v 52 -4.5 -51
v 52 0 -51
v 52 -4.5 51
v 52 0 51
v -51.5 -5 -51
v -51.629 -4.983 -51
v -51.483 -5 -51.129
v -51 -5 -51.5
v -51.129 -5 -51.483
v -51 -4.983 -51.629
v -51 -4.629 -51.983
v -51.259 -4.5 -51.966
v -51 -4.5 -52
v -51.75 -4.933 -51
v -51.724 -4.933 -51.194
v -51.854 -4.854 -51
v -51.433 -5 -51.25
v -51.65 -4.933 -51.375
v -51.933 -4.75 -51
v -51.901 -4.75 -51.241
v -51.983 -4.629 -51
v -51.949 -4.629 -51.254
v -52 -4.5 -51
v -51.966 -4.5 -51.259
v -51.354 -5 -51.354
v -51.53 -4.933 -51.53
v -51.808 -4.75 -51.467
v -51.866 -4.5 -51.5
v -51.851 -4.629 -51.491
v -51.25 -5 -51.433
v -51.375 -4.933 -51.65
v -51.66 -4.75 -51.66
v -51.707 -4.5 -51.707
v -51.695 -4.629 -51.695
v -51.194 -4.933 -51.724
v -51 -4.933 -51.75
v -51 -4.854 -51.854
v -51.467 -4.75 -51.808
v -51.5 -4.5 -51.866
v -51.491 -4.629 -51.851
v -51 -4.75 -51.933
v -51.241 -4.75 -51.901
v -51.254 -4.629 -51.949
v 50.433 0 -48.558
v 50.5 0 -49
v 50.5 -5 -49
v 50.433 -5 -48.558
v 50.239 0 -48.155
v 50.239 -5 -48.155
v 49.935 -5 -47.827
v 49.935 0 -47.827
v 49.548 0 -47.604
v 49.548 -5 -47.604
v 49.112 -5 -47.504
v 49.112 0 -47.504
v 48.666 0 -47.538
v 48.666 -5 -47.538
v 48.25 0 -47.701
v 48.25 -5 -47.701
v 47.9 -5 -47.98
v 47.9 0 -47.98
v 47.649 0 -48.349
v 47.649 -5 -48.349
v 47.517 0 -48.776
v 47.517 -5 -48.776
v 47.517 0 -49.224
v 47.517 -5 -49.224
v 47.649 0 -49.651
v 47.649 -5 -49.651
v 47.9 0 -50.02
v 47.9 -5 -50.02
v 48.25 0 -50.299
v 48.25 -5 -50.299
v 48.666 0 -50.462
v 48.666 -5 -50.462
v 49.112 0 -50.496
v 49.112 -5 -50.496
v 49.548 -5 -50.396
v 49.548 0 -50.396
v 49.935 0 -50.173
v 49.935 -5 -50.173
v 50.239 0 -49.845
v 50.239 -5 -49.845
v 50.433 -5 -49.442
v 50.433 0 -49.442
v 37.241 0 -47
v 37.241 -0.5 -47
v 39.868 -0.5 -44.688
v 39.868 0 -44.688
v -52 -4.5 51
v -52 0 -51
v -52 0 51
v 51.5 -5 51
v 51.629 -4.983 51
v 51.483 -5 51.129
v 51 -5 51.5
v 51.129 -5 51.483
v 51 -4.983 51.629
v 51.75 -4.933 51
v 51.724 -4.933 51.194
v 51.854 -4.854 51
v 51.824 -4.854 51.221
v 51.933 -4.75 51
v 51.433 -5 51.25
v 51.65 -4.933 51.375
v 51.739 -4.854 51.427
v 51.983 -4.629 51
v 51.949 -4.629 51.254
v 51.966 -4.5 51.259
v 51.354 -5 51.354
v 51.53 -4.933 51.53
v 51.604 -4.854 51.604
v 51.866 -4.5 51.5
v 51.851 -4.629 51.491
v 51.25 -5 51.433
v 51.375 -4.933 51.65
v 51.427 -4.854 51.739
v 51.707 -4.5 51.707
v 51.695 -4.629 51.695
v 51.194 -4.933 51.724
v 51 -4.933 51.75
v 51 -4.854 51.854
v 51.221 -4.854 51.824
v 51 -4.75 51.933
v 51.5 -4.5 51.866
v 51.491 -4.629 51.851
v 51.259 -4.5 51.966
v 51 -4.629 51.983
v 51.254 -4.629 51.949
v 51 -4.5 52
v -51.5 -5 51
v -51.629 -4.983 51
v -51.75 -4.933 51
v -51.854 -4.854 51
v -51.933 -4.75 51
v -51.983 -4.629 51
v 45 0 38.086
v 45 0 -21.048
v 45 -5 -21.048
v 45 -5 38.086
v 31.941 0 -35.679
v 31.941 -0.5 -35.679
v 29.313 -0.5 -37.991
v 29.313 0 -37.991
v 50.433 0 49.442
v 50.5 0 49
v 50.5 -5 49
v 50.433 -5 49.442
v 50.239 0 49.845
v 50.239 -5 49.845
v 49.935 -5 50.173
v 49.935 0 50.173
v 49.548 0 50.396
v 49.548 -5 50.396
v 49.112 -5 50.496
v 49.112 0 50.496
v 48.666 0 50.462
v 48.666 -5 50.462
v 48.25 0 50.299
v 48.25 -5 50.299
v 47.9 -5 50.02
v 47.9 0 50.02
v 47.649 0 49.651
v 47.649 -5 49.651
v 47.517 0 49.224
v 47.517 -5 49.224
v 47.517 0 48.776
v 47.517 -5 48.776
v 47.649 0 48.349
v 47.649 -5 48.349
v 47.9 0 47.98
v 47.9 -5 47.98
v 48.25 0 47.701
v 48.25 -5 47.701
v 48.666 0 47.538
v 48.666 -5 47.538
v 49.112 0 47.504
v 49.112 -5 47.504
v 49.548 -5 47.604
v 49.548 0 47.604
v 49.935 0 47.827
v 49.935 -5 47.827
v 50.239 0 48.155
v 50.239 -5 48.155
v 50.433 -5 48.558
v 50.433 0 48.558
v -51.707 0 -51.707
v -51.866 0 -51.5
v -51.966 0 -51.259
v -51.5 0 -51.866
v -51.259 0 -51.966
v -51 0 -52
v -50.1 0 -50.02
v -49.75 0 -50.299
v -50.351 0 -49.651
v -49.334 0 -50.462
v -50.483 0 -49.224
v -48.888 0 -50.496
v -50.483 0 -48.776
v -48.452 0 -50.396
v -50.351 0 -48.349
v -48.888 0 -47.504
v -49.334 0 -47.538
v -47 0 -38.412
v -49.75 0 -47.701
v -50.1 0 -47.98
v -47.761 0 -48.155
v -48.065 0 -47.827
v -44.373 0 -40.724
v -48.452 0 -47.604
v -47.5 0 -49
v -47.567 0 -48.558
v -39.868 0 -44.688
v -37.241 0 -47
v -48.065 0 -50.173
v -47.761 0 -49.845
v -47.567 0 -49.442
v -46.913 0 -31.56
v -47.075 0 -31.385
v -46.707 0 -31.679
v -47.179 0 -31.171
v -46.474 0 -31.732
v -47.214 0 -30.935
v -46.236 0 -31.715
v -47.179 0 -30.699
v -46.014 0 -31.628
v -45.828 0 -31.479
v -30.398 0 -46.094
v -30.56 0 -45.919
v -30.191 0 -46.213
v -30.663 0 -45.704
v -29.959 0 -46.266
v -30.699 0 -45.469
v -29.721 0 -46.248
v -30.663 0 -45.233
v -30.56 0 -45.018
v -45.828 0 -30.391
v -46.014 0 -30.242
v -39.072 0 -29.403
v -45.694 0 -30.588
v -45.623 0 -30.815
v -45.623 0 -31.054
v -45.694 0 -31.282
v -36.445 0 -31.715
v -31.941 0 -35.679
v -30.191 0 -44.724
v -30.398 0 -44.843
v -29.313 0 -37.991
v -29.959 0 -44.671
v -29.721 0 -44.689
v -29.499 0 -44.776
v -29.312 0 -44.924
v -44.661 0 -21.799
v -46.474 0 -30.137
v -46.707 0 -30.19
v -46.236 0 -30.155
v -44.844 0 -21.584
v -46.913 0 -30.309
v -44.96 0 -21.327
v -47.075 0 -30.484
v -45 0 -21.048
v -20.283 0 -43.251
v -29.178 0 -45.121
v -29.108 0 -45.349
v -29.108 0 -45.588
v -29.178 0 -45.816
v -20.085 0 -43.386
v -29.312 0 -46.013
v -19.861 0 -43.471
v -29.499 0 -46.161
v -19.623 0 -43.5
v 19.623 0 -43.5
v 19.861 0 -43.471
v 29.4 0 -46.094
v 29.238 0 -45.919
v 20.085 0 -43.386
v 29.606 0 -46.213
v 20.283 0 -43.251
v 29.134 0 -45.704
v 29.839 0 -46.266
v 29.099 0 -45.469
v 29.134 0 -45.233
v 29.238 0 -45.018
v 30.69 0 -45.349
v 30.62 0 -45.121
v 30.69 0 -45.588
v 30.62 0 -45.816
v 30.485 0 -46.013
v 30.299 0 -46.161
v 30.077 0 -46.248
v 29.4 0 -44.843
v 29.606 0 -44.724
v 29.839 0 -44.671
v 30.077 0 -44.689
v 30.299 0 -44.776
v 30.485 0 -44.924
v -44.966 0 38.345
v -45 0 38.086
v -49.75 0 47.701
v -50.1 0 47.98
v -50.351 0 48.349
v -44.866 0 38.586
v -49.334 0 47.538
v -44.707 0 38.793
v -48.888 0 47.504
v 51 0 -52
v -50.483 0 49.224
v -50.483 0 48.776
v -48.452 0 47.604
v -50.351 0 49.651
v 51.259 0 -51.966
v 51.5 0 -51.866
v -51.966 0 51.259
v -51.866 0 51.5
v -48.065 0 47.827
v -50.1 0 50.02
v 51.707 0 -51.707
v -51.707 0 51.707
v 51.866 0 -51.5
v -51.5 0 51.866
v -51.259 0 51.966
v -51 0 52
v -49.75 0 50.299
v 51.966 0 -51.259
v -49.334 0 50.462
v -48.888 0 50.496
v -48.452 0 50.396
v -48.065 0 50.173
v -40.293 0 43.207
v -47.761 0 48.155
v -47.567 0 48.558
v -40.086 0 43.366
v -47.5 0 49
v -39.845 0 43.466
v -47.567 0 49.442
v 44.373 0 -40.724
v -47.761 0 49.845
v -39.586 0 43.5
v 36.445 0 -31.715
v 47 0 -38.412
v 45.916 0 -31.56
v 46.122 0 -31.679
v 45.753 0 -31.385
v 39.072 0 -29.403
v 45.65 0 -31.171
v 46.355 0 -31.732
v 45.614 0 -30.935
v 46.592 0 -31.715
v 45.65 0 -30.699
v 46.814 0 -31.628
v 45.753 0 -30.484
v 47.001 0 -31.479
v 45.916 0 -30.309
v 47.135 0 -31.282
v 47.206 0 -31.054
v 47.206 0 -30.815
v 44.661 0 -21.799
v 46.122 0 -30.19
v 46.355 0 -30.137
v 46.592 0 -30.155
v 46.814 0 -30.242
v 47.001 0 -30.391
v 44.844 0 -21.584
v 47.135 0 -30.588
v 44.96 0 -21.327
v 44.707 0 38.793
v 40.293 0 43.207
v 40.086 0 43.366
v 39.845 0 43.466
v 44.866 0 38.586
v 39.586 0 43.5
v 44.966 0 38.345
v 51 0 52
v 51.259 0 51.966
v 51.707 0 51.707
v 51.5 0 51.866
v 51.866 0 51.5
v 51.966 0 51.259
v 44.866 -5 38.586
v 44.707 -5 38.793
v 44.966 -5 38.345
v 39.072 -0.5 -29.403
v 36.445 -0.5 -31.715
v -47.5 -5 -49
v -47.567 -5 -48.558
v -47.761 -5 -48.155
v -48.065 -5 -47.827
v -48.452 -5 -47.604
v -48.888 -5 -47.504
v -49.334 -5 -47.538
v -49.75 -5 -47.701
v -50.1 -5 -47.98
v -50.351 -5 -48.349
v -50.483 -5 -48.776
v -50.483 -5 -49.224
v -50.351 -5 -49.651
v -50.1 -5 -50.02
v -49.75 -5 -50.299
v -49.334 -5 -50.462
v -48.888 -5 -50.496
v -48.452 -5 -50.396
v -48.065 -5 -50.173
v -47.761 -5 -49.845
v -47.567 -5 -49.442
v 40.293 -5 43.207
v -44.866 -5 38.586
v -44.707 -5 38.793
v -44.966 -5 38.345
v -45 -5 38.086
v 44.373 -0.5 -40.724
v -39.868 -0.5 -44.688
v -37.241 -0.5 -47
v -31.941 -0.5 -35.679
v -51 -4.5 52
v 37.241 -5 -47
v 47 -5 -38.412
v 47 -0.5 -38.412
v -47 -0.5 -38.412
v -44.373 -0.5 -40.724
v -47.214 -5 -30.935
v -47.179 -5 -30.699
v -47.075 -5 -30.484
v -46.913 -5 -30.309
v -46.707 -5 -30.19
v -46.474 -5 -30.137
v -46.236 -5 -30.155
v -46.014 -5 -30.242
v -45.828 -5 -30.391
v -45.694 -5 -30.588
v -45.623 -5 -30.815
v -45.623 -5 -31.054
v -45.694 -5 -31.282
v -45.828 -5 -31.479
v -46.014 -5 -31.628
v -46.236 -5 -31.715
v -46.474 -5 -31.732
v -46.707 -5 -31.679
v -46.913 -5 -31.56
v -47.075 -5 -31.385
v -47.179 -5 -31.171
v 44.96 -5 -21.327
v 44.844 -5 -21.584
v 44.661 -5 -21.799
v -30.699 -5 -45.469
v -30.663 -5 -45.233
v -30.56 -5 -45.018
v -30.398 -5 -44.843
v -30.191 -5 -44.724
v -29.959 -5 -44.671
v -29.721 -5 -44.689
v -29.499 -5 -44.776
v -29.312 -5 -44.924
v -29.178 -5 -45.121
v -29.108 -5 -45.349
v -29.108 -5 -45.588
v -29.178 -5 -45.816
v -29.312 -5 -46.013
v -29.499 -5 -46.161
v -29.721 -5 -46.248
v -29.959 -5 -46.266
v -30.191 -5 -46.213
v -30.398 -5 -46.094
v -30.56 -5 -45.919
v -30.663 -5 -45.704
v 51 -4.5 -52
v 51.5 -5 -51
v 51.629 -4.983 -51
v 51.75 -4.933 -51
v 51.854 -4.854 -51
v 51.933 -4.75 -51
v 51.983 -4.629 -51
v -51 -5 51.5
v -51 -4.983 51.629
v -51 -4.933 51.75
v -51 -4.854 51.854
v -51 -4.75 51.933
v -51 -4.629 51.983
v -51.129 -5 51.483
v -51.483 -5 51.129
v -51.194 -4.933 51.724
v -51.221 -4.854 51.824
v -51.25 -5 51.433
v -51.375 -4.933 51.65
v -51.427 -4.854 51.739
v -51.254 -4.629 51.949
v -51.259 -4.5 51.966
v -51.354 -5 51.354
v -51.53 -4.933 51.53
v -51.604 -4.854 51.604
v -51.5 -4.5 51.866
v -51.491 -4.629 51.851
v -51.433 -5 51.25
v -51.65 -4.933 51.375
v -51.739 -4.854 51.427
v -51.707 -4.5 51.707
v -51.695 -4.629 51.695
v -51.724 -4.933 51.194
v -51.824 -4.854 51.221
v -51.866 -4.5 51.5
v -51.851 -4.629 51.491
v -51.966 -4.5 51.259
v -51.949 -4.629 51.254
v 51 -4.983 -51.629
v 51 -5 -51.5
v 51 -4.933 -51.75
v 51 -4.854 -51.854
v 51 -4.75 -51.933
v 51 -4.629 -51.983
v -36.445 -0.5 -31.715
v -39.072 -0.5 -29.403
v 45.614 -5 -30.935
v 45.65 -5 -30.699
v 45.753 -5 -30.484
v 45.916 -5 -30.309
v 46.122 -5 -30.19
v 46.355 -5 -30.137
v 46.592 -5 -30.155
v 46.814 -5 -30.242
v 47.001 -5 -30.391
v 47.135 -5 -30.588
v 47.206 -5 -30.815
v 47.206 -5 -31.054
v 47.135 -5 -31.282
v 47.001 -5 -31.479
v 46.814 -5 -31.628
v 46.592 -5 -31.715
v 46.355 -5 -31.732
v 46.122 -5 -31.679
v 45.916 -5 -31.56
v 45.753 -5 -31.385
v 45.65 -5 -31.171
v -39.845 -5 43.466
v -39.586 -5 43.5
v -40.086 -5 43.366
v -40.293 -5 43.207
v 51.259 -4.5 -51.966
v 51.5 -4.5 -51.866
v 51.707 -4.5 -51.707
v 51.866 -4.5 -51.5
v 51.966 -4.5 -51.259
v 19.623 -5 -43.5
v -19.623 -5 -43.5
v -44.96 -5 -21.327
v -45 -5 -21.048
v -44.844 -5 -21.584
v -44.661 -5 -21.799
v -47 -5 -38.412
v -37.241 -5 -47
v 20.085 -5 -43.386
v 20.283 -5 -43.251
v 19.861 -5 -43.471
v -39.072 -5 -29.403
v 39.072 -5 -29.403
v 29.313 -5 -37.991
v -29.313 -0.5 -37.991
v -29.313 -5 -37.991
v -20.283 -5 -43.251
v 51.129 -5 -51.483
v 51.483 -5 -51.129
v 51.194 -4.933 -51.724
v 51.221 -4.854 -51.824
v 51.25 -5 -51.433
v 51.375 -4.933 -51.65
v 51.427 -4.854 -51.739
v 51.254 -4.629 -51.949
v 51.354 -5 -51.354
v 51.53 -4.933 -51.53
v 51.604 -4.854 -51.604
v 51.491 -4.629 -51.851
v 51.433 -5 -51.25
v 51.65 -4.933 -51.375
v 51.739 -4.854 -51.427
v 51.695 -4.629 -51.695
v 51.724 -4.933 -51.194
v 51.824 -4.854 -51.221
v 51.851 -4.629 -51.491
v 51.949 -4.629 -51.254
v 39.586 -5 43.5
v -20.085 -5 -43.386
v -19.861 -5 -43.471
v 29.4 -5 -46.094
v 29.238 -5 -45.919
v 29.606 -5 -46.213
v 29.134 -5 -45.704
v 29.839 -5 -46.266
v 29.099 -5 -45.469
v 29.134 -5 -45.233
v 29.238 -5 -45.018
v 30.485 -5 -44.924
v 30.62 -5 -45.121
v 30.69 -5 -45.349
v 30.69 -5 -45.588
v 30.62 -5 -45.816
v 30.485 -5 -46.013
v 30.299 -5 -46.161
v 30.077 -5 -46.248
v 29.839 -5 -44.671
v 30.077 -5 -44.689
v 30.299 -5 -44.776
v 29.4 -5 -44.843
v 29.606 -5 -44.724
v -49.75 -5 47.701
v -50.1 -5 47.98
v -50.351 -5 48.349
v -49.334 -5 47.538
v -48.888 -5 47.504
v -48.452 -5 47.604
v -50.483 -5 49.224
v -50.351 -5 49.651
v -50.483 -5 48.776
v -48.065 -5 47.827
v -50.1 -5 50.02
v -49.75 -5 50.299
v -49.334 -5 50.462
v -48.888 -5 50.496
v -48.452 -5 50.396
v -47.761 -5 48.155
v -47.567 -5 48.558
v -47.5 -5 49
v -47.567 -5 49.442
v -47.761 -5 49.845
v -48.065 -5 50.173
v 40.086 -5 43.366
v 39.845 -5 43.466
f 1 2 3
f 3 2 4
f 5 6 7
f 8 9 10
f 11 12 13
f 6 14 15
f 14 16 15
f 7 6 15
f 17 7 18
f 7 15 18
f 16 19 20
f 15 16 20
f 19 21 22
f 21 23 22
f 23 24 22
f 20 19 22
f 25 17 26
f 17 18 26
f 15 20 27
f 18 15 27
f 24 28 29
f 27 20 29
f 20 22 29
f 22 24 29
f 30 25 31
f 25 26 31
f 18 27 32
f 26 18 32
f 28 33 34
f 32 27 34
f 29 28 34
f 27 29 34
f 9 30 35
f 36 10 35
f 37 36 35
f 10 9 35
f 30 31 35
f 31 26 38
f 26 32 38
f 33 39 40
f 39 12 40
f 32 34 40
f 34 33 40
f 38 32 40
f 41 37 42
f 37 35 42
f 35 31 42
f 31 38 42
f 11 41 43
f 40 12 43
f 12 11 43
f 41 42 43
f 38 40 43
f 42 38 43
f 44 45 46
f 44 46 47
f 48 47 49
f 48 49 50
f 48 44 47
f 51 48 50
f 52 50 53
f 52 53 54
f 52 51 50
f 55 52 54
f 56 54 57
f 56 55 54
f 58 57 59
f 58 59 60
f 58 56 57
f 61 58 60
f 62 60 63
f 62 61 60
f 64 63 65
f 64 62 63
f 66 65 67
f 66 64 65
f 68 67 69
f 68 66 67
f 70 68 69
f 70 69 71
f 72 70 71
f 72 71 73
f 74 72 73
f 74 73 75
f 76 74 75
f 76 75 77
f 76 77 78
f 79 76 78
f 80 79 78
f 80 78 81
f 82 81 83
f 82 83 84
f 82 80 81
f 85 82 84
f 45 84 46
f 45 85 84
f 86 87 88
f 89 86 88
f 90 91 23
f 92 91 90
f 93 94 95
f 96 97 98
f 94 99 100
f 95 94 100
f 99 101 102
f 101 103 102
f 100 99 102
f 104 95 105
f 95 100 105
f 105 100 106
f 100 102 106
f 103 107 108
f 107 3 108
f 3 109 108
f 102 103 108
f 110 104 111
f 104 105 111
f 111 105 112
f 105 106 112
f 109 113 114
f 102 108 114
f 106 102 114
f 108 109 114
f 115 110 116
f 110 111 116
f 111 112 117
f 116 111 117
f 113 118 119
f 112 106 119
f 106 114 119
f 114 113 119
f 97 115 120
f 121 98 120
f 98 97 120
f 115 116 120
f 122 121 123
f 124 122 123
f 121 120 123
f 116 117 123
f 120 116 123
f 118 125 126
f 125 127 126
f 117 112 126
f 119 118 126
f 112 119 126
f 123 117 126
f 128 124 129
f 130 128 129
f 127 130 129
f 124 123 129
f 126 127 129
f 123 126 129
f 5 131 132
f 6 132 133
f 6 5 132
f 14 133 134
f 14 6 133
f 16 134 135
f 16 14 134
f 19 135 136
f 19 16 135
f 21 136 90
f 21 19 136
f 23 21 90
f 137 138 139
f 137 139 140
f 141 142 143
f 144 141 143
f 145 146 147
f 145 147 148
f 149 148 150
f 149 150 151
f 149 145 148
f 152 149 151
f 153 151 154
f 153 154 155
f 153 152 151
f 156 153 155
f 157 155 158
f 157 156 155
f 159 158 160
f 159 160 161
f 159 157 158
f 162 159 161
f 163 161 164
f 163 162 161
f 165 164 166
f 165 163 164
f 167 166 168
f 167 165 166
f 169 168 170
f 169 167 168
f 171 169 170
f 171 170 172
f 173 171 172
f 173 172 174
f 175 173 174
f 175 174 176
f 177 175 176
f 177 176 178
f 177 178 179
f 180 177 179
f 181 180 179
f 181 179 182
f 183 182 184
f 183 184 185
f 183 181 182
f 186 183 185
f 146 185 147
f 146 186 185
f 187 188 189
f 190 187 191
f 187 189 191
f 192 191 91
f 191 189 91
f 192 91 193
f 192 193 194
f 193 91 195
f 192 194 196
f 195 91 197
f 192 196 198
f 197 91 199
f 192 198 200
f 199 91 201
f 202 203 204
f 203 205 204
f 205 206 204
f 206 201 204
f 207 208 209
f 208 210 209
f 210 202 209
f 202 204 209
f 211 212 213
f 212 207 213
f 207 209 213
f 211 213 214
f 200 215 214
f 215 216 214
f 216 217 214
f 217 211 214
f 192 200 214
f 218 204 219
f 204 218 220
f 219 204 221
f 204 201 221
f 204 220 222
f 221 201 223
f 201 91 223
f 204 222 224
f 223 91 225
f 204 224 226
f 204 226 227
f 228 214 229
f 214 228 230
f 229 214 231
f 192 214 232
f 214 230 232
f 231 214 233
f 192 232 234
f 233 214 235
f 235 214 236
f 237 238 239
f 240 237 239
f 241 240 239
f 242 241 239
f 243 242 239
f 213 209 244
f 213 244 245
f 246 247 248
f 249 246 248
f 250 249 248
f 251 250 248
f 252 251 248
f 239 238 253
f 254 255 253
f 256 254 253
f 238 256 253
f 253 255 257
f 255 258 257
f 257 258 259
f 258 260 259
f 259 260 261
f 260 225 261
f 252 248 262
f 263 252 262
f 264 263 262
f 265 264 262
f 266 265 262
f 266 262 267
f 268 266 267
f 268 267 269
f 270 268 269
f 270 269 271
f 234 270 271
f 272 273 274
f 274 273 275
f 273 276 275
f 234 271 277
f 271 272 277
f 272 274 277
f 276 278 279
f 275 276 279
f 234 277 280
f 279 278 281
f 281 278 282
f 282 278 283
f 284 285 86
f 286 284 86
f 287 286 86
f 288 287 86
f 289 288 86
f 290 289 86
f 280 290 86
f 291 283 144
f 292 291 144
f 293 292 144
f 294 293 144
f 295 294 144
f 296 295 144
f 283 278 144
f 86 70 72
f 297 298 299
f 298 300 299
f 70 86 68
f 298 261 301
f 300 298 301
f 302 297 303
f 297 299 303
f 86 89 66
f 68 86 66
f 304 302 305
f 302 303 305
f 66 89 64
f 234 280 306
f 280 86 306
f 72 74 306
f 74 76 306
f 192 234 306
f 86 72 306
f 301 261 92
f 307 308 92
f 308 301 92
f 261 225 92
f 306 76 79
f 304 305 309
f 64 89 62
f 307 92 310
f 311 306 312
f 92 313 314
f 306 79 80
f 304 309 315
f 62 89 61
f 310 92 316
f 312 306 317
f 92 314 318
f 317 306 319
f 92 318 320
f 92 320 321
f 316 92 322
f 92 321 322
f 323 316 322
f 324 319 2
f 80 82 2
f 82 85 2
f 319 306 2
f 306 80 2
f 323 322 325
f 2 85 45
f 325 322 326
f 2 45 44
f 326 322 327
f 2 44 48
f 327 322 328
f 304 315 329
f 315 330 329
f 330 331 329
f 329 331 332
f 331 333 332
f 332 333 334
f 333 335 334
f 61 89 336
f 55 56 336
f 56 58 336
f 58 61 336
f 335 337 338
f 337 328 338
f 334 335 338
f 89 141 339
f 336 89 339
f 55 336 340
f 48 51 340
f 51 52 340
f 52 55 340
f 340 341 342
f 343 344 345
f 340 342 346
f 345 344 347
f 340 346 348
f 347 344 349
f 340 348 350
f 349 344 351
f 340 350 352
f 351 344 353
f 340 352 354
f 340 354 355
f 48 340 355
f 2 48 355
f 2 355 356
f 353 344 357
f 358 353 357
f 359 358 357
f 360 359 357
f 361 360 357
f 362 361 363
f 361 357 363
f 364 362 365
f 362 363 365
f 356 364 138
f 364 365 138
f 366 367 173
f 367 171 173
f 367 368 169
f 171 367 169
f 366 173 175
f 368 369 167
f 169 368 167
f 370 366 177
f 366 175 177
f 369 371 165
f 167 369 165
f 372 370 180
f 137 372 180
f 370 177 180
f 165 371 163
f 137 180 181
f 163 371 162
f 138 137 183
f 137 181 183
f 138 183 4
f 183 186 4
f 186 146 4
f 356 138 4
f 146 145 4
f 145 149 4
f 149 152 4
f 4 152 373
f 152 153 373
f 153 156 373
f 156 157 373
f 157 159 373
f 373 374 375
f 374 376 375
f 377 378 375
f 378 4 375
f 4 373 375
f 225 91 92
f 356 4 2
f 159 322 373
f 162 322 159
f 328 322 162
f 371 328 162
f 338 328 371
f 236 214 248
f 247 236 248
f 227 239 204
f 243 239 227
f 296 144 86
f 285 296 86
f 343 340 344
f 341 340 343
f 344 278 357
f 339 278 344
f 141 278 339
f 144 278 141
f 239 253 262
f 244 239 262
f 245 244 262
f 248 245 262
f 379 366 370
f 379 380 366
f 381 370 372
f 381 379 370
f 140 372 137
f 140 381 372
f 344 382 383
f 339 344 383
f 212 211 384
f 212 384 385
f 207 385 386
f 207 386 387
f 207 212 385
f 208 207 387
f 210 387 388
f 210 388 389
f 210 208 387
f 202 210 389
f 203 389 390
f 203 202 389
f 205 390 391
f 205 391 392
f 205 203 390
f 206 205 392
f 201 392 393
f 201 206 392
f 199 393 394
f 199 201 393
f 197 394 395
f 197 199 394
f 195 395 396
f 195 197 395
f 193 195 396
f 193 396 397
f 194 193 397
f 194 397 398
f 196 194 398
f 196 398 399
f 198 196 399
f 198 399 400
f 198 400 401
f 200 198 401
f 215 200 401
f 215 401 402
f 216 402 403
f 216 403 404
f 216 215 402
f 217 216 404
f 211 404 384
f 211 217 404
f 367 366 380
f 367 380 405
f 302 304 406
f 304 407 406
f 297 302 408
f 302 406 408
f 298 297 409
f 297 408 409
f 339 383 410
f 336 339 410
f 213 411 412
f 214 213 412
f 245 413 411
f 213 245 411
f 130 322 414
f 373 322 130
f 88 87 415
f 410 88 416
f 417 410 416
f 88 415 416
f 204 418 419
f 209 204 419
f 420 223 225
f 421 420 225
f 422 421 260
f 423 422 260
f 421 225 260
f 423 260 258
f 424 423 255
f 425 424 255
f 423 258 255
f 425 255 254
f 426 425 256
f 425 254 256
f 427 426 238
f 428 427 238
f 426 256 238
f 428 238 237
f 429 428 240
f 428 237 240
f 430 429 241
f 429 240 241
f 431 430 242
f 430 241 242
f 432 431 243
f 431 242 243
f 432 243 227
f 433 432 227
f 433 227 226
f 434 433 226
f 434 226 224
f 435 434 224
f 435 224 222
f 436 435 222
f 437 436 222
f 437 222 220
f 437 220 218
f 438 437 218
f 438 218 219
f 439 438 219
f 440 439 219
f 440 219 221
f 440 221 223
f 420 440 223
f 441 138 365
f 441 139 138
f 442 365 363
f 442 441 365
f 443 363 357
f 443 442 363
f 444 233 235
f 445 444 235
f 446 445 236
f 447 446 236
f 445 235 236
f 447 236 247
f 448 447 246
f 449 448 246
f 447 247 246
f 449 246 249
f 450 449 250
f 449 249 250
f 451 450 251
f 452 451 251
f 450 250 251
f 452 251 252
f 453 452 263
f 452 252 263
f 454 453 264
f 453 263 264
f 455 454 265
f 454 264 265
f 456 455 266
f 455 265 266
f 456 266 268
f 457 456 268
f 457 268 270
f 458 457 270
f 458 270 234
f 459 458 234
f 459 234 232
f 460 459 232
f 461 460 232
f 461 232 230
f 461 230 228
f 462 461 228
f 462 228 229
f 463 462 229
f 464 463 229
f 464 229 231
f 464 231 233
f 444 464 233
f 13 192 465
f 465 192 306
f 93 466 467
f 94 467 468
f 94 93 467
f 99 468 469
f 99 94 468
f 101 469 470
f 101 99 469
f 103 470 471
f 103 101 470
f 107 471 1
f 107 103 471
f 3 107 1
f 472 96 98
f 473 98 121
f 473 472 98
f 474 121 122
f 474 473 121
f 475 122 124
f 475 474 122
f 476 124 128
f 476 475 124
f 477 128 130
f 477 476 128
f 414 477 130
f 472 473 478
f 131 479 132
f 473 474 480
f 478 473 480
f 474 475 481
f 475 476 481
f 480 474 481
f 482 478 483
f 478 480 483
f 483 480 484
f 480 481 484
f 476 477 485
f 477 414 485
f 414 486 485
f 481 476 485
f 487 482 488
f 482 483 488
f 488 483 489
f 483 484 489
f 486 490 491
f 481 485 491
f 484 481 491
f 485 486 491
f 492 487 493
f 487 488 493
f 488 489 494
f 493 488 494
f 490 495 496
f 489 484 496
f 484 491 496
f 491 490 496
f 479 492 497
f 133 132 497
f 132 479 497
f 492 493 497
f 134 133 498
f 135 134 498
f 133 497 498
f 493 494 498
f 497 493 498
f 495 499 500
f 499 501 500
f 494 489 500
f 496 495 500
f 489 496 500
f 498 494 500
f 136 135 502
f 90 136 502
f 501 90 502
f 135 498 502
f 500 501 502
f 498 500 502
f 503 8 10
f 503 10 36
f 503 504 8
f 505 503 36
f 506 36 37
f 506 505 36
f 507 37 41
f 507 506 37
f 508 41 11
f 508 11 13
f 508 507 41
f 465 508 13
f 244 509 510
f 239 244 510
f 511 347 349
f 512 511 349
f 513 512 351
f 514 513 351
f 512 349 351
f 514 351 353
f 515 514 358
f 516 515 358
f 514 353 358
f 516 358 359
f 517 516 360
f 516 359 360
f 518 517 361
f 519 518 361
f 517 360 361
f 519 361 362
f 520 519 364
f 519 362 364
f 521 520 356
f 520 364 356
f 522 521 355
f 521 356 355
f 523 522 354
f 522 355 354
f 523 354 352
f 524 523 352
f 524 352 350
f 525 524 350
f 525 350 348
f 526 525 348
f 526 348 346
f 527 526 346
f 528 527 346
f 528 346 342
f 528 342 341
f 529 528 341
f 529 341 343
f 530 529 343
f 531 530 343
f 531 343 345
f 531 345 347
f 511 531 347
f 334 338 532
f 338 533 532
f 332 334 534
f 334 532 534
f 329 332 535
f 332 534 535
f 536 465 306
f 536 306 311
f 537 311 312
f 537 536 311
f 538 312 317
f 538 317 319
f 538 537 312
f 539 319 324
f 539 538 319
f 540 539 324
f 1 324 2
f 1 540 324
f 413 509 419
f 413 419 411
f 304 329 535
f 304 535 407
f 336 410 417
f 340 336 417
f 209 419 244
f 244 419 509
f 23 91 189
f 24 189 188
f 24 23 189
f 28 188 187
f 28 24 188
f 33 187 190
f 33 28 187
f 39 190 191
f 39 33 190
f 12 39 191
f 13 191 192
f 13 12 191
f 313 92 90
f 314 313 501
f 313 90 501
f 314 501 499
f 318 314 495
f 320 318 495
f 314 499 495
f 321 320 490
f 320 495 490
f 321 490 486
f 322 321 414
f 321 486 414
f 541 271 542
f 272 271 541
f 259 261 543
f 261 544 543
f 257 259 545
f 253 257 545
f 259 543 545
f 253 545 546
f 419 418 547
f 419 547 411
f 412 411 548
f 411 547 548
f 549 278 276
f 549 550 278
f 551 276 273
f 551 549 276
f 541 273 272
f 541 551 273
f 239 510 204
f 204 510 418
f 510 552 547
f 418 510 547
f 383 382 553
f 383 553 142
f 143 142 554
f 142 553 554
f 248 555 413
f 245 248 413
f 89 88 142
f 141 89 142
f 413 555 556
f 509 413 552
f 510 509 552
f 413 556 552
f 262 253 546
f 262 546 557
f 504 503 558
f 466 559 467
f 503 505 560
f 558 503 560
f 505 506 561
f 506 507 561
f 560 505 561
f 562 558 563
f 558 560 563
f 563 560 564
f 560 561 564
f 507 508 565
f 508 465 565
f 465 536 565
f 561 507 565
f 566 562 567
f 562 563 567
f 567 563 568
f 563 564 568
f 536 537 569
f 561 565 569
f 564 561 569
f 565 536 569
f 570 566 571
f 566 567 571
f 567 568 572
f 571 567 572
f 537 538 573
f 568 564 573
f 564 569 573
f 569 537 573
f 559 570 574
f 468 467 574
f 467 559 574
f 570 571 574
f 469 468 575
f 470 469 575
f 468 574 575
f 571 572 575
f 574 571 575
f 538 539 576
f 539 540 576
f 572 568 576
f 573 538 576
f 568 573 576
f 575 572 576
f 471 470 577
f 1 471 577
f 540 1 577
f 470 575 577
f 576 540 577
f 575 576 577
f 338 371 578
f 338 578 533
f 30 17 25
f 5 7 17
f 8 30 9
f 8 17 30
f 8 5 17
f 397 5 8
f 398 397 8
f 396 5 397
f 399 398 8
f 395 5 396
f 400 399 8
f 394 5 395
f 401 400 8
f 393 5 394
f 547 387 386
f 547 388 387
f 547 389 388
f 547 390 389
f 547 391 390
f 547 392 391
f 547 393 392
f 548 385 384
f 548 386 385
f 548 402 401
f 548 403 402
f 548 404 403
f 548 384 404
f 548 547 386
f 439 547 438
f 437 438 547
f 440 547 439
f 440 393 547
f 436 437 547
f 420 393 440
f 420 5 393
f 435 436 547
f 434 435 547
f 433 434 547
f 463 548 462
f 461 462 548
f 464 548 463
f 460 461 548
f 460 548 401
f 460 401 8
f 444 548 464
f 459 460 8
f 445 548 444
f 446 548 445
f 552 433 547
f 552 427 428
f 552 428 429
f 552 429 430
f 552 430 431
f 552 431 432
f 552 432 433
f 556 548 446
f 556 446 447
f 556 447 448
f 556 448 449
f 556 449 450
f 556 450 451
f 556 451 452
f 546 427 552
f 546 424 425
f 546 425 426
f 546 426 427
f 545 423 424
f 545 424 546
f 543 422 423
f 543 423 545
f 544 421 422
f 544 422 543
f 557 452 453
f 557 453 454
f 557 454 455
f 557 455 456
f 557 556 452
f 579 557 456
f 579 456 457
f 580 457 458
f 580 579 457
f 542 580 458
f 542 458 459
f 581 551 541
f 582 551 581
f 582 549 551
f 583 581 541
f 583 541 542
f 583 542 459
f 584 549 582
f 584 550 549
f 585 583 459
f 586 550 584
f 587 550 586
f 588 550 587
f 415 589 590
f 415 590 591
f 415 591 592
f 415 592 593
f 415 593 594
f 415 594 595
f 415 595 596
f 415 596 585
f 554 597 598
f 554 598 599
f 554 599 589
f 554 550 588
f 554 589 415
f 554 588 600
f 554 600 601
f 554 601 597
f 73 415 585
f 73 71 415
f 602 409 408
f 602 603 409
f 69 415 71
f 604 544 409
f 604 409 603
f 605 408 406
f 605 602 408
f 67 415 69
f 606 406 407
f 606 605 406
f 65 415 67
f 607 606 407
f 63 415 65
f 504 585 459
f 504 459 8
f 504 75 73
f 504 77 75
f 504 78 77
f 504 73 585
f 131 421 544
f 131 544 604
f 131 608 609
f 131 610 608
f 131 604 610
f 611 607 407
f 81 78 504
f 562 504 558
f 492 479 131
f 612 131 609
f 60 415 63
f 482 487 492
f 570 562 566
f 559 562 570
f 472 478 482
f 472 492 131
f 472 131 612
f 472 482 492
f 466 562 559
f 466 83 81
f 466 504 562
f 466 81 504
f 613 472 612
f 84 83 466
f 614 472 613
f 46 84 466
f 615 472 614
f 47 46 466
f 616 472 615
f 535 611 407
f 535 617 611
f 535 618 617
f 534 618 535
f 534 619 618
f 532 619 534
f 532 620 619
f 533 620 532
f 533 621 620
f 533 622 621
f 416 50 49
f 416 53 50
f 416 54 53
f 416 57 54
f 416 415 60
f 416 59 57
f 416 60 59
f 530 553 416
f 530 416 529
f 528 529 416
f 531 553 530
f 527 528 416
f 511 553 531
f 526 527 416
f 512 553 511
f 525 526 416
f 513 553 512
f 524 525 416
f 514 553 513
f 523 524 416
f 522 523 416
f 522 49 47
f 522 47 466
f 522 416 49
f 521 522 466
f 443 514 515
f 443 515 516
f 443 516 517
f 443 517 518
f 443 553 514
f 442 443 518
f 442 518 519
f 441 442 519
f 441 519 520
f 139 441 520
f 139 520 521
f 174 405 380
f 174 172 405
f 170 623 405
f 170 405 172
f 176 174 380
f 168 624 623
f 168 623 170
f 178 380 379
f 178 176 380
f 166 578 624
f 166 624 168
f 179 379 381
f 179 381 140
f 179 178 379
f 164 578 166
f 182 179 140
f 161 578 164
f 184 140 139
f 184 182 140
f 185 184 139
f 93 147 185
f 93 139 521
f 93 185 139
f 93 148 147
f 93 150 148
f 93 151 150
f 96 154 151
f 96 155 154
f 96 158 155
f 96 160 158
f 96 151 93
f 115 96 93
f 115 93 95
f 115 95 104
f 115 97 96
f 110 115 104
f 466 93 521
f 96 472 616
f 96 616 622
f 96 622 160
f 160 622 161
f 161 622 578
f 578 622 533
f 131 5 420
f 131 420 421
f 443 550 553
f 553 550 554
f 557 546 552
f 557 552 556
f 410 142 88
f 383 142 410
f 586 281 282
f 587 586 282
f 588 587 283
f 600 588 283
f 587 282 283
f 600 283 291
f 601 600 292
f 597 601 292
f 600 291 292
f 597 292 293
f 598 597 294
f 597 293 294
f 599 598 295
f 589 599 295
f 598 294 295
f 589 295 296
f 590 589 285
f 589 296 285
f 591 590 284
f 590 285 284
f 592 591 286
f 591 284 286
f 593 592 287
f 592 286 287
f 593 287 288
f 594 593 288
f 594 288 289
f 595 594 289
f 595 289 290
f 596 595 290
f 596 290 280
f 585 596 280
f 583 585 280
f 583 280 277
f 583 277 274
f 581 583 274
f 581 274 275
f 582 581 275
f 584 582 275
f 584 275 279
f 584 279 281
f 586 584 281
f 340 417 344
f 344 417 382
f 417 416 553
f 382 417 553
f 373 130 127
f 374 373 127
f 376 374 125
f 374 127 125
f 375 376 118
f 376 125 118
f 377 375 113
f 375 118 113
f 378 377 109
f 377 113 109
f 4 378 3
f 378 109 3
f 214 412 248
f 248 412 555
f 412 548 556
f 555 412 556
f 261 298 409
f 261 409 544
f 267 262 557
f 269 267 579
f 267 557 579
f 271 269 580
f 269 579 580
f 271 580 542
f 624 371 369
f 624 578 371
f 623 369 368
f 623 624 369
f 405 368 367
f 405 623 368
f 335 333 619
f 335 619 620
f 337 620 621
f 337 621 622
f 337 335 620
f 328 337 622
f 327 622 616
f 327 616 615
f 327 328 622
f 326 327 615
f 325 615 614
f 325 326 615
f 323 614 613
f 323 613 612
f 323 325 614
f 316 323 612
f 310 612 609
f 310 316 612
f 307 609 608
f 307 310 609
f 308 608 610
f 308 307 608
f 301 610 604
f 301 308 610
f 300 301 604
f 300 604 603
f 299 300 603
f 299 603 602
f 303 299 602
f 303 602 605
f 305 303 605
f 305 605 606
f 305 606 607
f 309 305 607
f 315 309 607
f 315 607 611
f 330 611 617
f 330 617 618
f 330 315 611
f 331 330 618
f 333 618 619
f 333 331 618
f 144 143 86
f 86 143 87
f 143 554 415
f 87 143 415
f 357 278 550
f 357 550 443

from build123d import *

# Parameters (mm, degrees)
F0_W      = 104
F0_H      = 104
F0_R      = 1.5
F1_DEPTH  = 5
F1_FACE_W = 104
F1_FACE_H = 104
F1_FACE_R = 1.5
F3_DEPTH  = 25
F5_DEPTH  = 4.5
F7_DEPTH  = 2
F8_D      = 1.6
F8_DEPTH  = 15
F9_R      = 1
F10_R     = 0.5


with BuildPart() as f1:
    # F0 (on Front) → F1 (new body)
    with BuildSketch(Plane.XZ):
        Rectangle(F0_W, F0_H)
        with Locations((-49, -49)):
            Circle(F0_R, mode=Mode.SUBTRACT)
        with Locations((49, -49)):
            Circle(F0_R, mode=Mode.SUBTRACT)
        with Locations((-49, 49)):
            Circle(F0_R, mode=Mode.SUBTRACT)
        with Locations((49, 49)):
            Circle(F0_R, mode=Mode.SUBTRACT)
    extrude(amount=F1_DEPTH)

    # F2 (on Front) + F1_face (on face) → F3 (cut)
    with BuildSketch(Plane.XZ):
        Polygon((40, 43.5), (-40, 43.5), (-45, 38.5), (-45, -21.5), (-20, -43.5), (20, -43.5), (45, -21.5), (45, 38.5), align=None)
    with BuildSketch(Plane.XZ.offset(5)):
        Rectangle(F1_FACE_W, F1_FACE_H)
        with Locations((-49, -49)):
            Circle(F1_FACE_R, mode=Mode.SUBTRACT)
        with Locations((49, -49)):
            Circle(F1_FACE_R, mode=Mode.SUBTRACT)
        with Locations((-49, 49)):
            Circle(F1_FACE_R, mode=Mode.SUBTRACT)
        with Locations((49, 49)):
            Circle(F1_FACE_R, mode=Mode.SUBTRACT)
    extrude(amount=F3_DEPTH, mode=Mode.SUBTRACT)

    # F4 (on face) → F5 (cut)
    with BuildSketch(Plane.XZ.offset(5)):
        Polygon((-29.31319, -37.991438), (-39.072465, -29.403275), (-47, -38.411837), (-37.240724, -47), align=None)
        Polygon((47, -38.411837), (39.072465, -29.403275), (29.31319, -37.991438), (37.240724, -47), align=None)
    extrude(amount=-F5_DEPTH, mode=Mode.SUBTRACT)

    # F6 (on face) → F7 (cut)
    with BuildSketch(Plane.XZ.offset(0.5)):
        Polygon((-39.072465, -29.403275), (-47, -38.411837), (-44.372503, -40.724035), (-36.444968, -31.715473), align=None)
        Polygon((-29.31319, -37.991438), (-31.940687, -35.67924), (-39.868222, -44.687802), (-37.240724, -47), align=None)
        Polygon((31.940687, -35.67924), (29.31319, -37.991438), (37.240724, -47), (39.868222, -44.687802), align=None)
        Polygon((36.444968, -31.715473), (44.372503, -40.724035), (47, -38.411837), (39.072465, -29.403275), align=None)
    extrude(amount=-F7_DEPTH, mode=Mode.SUBTRACT)

    # F8
    with Locations(Plane.XZ.offset(5)):
        with Locations((-46.414443, -30.934731), (-29.898746, -45.468544), (29.898746, -45.468544), (46.414443, -30.934731)):
            Hole(F8_D / 2, depth=F8_DEPTH)

    # F9
    f9_edges = [f1.edges().sort_by_distance(p)[0] for p in [
        (-52, -2.5, 52),
        (52, -2.5, 52),
        (52, -2.5, -52),
        (-52, -2.5, -52),
        (-45, -2.5, -21.5),
        (-20, -2.5, -43.5),
        (20, -2.5, -43.5),
        (45, -2.5, -21.5),
        (-45, -2.5, 38.5),
        (-40, -2.5, 43.5),
        (40, -2.5, 43.5),
        (45, -2.5, 38.5),
    ]]
    fillet(f9_edges, radius=F9_R)

    # F10
    f10_edges = [f1.edges().sort_by_distance(p)[0] for p in [
        (0, -5, -52),
    ]]
    fillet(f10_edges, radius=F10_R)


solid = f1.part
